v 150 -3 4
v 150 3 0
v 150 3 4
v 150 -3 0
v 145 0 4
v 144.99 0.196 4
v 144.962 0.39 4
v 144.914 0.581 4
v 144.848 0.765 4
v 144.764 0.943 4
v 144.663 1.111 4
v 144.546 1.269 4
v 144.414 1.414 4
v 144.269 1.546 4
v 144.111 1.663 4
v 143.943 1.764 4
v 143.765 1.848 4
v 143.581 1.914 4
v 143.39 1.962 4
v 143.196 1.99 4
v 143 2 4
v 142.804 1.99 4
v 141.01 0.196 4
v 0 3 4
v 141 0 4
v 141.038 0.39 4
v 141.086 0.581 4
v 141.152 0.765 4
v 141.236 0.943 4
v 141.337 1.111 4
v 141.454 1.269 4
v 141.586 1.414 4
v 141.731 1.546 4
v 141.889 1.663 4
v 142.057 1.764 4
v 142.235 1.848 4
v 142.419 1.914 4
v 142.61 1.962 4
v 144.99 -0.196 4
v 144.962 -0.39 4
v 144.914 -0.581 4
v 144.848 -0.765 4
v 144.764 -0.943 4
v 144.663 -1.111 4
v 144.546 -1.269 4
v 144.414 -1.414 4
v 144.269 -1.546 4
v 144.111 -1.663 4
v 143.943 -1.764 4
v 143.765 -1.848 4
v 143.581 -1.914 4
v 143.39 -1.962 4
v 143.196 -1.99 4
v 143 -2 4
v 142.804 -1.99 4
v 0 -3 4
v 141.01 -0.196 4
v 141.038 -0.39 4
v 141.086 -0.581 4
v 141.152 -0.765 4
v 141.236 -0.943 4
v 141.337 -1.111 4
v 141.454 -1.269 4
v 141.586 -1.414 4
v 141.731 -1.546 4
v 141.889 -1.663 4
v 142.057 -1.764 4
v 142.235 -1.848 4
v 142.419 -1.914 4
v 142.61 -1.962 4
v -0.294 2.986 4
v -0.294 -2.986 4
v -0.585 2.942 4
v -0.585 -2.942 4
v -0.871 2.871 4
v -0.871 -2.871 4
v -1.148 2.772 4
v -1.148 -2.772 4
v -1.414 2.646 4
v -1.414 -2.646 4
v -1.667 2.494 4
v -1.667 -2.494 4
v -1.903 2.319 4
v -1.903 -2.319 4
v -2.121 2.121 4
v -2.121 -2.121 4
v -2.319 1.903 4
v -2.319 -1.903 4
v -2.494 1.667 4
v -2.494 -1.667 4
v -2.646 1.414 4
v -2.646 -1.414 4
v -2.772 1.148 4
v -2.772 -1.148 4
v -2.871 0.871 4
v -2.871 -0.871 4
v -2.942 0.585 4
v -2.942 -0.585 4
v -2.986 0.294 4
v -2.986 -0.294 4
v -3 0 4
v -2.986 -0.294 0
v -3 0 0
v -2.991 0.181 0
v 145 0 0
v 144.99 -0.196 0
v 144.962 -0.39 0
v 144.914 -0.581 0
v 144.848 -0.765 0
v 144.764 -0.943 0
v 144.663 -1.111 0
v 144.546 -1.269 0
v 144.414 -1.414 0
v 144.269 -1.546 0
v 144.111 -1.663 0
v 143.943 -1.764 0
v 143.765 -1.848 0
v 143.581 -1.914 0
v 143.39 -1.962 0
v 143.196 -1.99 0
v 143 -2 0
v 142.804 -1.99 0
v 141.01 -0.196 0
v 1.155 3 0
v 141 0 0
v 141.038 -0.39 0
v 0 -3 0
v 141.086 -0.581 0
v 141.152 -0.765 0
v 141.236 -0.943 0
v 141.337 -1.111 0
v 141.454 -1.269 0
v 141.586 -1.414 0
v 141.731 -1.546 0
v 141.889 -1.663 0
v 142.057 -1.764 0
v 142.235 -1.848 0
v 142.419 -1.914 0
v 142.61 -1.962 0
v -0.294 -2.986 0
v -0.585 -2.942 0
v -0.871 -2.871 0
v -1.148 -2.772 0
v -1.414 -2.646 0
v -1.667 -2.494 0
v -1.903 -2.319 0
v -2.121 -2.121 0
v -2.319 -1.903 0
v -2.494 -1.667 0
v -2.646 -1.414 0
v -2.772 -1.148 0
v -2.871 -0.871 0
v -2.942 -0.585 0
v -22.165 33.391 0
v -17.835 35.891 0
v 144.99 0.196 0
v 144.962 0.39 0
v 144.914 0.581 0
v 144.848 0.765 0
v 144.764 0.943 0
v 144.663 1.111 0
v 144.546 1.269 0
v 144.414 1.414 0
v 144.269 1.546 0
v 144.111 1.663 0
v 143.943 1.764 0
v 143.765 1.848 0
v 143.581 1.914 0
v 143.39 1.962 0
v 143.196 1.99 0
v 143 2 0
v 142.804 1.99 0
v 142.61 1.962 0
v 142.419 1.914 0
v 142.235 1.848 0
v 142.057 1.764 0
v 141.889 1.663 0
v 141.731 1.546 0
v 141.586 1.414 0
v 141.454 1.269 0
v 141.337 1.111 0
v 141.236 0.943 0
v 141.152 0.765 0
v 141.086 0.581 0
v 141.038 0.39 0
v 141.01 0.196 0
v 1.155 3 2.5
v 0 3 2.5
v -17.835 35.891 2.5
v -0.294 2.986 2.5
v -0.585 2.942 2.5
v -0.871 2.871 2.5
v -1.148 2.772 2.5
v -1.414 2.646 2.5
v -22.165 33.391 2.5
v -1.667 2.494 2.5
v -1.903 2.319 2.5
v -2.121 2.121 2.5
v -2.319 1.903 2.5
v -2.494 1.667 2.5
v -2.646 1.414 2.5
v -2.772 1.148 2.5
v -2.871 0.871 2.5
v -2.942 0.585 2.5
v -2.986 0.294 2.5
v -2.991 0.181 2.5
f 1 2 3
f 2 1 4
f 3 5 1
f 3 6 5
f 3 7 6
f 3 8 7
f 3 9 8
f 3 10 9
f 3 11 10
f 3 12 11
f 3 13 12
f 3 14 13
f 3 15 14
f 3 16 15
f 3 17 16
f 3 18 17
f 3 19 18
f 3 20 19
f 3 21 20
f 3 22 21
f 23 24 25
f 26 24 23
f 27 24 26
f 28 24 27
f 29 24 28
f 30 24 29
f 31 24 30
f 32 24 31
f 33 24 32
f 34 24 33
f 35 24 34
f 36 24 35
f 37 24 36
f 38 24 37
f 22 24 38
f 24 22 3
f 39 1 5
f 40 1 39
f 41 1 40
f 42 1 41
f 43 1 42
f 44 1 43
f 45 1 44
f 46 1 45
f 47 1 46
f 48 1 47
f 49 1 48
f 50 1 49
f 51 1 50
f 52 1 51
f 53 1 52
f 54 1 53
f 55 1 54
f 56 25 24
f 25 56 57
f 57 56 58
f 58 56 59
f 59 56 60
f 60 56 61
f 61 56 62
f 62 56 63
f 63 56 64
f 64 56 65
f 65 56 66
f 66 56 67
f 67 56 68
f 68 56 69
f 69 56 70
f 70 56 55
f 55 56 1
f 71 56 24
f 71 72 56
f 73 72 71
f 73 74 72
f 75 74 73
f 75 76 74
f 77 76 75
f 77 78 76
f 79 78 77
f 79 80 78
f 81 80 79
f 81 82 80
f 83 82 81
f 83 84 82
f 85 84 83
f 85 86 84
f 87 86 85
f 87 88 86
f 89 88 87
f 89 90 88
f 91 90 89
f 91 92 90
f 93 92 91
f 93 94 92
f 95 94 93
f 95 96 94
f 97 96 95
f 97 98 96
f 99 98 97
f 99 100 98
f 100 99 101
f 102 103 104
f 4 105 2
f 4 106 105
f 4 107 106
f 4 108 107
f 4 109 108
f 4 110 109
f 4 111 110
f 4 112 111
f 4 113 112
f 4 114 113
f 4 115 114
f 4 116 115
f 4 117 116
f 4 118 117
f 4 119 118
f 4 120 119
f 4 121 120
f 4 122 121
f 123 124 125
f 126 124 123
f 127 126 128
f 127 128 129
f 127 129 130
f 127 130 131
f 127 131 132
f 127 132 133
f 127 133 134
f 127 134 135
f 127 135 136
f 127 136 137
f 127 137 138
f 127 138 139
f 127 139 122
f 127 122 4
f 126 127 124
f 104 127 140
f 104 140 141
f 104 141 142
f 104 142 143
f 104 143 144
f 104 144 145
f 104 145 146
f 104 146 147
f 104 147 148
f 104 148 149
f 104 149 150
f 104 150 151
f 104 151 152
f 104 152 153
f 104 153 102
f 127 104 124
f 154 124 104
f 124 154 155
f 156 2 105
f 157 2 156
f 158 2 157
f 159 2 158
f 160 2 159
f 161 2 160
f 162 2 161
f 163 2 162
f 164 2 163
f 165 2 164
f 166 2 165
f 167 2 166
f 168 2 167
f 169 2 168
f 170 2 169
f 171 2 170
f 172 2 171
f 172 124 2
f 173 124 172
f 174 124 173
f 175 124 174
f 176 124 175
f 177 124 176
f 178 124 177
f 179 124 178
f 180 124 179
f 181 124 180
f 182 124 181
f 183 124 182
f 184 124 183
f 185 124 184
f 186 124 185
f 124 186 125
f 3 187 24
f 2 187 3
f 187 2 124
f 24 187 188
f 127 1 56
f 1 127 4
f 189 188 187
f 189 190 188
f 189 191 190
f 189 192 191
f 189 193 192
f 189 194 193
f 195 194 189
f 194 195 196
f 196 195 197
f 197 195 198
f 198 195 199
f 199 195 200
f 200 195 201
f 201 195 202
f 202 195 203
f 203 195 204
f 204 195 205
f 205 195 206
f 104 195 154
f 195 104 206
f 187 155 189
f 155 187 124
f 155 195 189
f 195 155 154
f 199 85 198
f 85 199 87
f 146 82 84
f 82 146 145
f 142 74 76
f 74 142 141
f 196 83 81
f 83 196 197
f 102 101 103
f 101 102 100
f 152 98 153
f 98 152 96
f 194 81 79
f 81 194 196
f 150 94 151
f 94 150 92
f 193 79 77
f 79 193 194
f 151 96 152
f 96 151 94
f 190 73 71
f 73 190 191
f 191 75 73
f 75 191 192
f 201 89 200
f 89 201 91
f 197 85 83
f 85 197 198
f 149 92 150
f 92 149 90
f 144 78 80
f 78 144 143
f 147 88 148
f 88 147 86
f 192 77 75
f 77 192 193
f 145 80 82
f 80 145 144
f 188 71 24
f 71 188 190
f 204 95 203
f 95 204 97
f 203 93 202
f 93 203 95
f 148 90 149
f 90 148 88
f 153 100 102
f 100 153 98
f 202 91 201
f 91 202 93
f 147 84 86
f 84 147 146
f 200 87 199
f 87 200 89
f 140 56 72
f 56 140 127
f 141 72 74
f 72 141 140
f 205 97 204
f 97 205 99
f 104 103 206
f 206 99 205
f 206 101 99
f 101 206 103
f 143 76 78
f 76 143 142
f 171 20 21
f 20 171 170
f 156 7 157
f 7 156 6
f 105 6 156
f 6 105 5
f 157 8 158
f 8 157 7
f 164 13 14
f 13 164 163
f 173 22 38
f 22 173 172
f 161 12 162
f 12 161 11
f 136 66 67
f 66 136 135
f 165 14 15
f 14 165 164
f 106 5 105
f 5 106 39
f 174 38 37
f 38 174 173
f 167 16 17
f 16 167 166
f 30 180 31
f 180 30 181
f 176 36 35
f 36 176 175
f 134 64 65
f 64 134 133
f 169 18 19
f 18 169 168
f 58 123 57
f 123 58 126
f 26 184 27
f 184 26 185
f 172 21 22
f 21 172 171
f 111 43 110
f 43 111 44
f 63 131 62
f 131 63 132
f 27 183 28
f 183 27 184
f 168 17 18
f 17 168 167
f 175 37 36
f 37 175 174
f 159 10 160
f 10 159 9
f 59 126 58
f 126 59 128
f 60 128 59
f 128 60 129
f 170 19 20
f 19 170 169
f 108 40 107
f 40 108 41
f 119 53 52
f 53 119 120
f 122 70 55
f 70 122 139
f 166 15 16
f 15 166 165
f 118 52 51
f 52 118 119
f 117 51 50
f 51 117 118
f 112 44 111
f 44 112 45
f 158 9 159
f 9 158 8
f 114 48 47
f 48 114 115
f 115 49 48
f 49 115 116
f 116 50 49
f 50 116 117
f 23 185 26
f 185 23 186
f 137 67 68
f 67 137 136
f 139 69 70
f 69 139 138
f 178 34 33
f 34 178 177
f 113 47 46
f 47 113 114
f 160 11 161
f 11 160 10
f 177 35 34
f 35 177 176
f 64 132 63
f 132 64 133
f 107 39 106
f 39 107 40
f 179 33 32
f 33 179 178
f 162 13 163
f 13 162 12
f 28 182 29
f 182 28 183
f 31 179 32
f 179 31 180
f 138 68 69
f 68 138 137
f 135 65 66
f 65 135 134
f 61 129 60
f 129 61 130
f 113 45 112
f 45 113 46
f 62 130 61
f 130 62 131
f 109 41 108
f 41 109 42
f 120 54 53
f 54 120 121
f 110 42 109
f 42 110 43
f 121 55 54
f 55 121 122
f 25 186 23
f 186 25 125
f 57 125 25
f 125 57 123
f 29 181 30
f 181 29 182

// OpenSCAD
// L-shaped (hockey-stick) cell spreader for plating bacteria
// Dimensions measured with calipers

// Handle dimensions
handle_length = 150;
handle_width = 6;
handle_thickness = 4;

// Spreading foot dimensions
foot_length = 40;
foot_width = 5;
foot_thickness = 2.5;

// Boss dimensions
boss_diameter = 6;
boss_height = 4;

// Hanging hole dimensions
hole_diameter = 4;
hole_x = 143;
hole_y = 0;

// Angle of the foot relative to +X axis (120 degrees counter-clockwise)
foot_angle = 120;

// Quality of curved shapes
$fn = 64;

// The part rests on the XY plane at z = 0 and builds upward (+Z).
// The joint is at the origin (0,0,0).
// The handle extends from x=0 to x=150 along the +X axis.
// The foot extends from the origin at 120 degrees from +X.

difference() {
    union() {
        // Handle: bar from x=0 to x=150, y=-3 to 3, z=0 to 4
        // Centered in Y at 0, so y goes from -handle_width/2 to handle_width/2
        translate([0, -handle_width/2, 0])
            cube([handle_length, handle_width, handle_thickness], center = false);

        // Spreading foot: bar starting at origin, pointing 120 degrees from +X
        // Length 40, width 5, thickness 2.5
        // We model the foot as a cube aligned with X, then rotate it.
        // The cube is defined from x=0 to x=foot_length, y=-foot_width/2 to foot_width/2, z=0 to foot_thickness
        rotate([0, 0, foot_angle])
            translate([0, -foot_width/2, 0])
                cube([foot_length, foot_width, foot_thickness], center = false);

        // Boss: cylinder at origin, diameter 6, height 4
        // Centered at x=0, y=0, starting at z=0
        translate([0, 0, 0])
            cylinder(h = boss_height, r = boss_diameter/2, center = false);
    }

    // Hanging hole: 4mm diameter, through the handle at x=143, y=0
    // The hole goes through the z-direction.
    // Extend slightly past the handle thickness (4mm) to ensure clean cut.
    // The handle is at z=0 to z=4. We cut from z=-0.5 to z=4.5.
    translate([hole_x, hole_y, -0.5])
        cylinder(h = handle_thickness + 1, r = hole_diameter/2, center = false);
}
